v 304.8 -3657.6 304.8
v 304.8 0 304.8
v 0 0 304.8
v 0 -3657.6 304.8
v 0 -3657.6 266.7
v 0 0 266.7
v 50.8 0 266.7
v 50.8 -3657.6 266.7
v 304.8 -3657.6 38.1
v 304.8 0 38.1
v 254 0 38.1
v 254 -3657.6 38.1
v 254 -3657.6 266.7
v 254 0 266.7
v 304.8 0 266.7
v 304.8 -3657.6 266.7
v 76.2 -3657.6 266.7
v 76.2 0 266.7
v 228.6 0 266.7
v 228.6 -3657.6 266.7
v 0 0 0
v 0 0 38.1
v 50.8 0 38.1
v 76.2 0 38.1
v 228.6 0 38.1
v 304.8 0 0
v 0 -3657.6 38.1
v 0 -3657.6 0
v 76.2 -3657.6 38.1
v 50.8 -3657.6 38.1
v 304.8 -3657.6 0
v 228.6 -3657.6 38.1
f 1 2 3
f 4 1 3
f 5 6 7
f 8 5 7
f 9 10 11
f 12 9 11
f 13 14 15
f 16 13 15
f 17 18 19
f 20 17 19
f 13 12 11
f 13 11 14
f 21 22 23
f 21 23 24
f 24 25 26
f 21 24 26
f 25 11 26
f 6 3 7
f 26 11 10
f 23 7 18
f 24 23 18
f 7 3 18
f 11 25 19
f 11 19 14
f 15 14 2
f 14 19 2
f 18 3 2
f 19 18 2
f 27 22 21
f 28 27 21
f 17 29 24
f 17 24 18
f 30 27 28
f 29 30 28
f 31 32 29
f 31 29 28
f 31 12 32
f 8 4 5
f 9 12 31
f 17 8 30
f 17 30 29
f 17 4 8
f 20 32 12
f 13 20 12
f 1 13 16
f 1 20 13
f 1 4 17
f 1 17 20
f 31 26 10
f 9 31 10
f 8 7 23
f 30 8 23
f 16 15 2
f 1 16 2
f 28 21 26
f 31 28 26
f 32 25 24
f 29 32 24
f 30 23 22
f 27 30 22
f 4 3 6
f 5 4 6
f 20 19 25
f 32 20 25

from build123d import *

# Parameters (mm, degrees)
F1_DEPTH = 3657.6


with BuildPart() as f1:
    # F0 (on Front) → F1 (new body)
    with BuildSketch(Plane.XZ):
        Polygon((0, 38.1), (0, 0), (304.8, 0), (304.8, 38.1), (254, 38.1), (254, 25.4), (228.6, 25.4), (228.6, 38.1), (76.2, 38.1), (76.2, 25.4), (50.8, 25.4), (50.8, 38.1), align=None)
        Polygon((50.8, 266.7), (50.8, 38.1), (50.8, 25.4), (76.2, 25.4), (76.2, 38.1), (76.2, 266.7), (76.2, 279.4), (50.8, 279.4), align=None)
        Polygon((254, 25.4), (254, 38.1), (254, 266.7), (254, 279.4), (228.6, 279.4), (228.6, 266.7), (228.6, 38.1), (228.6, 25.4), align=None)
        Polygon((0, 266.7), (50.8, 266.7), (50.8, 279.4), (76.2, 279.4), (76.2, 266.7), (228.6, 266.7), (228.6, 279.4), (254, 279.4), (254, 266.7), (304.8, 266.7), (304.8, 304.8), (0, 304.8), align=None)
    extrude(amount=F1_DEPTH)


solid = f1.part
